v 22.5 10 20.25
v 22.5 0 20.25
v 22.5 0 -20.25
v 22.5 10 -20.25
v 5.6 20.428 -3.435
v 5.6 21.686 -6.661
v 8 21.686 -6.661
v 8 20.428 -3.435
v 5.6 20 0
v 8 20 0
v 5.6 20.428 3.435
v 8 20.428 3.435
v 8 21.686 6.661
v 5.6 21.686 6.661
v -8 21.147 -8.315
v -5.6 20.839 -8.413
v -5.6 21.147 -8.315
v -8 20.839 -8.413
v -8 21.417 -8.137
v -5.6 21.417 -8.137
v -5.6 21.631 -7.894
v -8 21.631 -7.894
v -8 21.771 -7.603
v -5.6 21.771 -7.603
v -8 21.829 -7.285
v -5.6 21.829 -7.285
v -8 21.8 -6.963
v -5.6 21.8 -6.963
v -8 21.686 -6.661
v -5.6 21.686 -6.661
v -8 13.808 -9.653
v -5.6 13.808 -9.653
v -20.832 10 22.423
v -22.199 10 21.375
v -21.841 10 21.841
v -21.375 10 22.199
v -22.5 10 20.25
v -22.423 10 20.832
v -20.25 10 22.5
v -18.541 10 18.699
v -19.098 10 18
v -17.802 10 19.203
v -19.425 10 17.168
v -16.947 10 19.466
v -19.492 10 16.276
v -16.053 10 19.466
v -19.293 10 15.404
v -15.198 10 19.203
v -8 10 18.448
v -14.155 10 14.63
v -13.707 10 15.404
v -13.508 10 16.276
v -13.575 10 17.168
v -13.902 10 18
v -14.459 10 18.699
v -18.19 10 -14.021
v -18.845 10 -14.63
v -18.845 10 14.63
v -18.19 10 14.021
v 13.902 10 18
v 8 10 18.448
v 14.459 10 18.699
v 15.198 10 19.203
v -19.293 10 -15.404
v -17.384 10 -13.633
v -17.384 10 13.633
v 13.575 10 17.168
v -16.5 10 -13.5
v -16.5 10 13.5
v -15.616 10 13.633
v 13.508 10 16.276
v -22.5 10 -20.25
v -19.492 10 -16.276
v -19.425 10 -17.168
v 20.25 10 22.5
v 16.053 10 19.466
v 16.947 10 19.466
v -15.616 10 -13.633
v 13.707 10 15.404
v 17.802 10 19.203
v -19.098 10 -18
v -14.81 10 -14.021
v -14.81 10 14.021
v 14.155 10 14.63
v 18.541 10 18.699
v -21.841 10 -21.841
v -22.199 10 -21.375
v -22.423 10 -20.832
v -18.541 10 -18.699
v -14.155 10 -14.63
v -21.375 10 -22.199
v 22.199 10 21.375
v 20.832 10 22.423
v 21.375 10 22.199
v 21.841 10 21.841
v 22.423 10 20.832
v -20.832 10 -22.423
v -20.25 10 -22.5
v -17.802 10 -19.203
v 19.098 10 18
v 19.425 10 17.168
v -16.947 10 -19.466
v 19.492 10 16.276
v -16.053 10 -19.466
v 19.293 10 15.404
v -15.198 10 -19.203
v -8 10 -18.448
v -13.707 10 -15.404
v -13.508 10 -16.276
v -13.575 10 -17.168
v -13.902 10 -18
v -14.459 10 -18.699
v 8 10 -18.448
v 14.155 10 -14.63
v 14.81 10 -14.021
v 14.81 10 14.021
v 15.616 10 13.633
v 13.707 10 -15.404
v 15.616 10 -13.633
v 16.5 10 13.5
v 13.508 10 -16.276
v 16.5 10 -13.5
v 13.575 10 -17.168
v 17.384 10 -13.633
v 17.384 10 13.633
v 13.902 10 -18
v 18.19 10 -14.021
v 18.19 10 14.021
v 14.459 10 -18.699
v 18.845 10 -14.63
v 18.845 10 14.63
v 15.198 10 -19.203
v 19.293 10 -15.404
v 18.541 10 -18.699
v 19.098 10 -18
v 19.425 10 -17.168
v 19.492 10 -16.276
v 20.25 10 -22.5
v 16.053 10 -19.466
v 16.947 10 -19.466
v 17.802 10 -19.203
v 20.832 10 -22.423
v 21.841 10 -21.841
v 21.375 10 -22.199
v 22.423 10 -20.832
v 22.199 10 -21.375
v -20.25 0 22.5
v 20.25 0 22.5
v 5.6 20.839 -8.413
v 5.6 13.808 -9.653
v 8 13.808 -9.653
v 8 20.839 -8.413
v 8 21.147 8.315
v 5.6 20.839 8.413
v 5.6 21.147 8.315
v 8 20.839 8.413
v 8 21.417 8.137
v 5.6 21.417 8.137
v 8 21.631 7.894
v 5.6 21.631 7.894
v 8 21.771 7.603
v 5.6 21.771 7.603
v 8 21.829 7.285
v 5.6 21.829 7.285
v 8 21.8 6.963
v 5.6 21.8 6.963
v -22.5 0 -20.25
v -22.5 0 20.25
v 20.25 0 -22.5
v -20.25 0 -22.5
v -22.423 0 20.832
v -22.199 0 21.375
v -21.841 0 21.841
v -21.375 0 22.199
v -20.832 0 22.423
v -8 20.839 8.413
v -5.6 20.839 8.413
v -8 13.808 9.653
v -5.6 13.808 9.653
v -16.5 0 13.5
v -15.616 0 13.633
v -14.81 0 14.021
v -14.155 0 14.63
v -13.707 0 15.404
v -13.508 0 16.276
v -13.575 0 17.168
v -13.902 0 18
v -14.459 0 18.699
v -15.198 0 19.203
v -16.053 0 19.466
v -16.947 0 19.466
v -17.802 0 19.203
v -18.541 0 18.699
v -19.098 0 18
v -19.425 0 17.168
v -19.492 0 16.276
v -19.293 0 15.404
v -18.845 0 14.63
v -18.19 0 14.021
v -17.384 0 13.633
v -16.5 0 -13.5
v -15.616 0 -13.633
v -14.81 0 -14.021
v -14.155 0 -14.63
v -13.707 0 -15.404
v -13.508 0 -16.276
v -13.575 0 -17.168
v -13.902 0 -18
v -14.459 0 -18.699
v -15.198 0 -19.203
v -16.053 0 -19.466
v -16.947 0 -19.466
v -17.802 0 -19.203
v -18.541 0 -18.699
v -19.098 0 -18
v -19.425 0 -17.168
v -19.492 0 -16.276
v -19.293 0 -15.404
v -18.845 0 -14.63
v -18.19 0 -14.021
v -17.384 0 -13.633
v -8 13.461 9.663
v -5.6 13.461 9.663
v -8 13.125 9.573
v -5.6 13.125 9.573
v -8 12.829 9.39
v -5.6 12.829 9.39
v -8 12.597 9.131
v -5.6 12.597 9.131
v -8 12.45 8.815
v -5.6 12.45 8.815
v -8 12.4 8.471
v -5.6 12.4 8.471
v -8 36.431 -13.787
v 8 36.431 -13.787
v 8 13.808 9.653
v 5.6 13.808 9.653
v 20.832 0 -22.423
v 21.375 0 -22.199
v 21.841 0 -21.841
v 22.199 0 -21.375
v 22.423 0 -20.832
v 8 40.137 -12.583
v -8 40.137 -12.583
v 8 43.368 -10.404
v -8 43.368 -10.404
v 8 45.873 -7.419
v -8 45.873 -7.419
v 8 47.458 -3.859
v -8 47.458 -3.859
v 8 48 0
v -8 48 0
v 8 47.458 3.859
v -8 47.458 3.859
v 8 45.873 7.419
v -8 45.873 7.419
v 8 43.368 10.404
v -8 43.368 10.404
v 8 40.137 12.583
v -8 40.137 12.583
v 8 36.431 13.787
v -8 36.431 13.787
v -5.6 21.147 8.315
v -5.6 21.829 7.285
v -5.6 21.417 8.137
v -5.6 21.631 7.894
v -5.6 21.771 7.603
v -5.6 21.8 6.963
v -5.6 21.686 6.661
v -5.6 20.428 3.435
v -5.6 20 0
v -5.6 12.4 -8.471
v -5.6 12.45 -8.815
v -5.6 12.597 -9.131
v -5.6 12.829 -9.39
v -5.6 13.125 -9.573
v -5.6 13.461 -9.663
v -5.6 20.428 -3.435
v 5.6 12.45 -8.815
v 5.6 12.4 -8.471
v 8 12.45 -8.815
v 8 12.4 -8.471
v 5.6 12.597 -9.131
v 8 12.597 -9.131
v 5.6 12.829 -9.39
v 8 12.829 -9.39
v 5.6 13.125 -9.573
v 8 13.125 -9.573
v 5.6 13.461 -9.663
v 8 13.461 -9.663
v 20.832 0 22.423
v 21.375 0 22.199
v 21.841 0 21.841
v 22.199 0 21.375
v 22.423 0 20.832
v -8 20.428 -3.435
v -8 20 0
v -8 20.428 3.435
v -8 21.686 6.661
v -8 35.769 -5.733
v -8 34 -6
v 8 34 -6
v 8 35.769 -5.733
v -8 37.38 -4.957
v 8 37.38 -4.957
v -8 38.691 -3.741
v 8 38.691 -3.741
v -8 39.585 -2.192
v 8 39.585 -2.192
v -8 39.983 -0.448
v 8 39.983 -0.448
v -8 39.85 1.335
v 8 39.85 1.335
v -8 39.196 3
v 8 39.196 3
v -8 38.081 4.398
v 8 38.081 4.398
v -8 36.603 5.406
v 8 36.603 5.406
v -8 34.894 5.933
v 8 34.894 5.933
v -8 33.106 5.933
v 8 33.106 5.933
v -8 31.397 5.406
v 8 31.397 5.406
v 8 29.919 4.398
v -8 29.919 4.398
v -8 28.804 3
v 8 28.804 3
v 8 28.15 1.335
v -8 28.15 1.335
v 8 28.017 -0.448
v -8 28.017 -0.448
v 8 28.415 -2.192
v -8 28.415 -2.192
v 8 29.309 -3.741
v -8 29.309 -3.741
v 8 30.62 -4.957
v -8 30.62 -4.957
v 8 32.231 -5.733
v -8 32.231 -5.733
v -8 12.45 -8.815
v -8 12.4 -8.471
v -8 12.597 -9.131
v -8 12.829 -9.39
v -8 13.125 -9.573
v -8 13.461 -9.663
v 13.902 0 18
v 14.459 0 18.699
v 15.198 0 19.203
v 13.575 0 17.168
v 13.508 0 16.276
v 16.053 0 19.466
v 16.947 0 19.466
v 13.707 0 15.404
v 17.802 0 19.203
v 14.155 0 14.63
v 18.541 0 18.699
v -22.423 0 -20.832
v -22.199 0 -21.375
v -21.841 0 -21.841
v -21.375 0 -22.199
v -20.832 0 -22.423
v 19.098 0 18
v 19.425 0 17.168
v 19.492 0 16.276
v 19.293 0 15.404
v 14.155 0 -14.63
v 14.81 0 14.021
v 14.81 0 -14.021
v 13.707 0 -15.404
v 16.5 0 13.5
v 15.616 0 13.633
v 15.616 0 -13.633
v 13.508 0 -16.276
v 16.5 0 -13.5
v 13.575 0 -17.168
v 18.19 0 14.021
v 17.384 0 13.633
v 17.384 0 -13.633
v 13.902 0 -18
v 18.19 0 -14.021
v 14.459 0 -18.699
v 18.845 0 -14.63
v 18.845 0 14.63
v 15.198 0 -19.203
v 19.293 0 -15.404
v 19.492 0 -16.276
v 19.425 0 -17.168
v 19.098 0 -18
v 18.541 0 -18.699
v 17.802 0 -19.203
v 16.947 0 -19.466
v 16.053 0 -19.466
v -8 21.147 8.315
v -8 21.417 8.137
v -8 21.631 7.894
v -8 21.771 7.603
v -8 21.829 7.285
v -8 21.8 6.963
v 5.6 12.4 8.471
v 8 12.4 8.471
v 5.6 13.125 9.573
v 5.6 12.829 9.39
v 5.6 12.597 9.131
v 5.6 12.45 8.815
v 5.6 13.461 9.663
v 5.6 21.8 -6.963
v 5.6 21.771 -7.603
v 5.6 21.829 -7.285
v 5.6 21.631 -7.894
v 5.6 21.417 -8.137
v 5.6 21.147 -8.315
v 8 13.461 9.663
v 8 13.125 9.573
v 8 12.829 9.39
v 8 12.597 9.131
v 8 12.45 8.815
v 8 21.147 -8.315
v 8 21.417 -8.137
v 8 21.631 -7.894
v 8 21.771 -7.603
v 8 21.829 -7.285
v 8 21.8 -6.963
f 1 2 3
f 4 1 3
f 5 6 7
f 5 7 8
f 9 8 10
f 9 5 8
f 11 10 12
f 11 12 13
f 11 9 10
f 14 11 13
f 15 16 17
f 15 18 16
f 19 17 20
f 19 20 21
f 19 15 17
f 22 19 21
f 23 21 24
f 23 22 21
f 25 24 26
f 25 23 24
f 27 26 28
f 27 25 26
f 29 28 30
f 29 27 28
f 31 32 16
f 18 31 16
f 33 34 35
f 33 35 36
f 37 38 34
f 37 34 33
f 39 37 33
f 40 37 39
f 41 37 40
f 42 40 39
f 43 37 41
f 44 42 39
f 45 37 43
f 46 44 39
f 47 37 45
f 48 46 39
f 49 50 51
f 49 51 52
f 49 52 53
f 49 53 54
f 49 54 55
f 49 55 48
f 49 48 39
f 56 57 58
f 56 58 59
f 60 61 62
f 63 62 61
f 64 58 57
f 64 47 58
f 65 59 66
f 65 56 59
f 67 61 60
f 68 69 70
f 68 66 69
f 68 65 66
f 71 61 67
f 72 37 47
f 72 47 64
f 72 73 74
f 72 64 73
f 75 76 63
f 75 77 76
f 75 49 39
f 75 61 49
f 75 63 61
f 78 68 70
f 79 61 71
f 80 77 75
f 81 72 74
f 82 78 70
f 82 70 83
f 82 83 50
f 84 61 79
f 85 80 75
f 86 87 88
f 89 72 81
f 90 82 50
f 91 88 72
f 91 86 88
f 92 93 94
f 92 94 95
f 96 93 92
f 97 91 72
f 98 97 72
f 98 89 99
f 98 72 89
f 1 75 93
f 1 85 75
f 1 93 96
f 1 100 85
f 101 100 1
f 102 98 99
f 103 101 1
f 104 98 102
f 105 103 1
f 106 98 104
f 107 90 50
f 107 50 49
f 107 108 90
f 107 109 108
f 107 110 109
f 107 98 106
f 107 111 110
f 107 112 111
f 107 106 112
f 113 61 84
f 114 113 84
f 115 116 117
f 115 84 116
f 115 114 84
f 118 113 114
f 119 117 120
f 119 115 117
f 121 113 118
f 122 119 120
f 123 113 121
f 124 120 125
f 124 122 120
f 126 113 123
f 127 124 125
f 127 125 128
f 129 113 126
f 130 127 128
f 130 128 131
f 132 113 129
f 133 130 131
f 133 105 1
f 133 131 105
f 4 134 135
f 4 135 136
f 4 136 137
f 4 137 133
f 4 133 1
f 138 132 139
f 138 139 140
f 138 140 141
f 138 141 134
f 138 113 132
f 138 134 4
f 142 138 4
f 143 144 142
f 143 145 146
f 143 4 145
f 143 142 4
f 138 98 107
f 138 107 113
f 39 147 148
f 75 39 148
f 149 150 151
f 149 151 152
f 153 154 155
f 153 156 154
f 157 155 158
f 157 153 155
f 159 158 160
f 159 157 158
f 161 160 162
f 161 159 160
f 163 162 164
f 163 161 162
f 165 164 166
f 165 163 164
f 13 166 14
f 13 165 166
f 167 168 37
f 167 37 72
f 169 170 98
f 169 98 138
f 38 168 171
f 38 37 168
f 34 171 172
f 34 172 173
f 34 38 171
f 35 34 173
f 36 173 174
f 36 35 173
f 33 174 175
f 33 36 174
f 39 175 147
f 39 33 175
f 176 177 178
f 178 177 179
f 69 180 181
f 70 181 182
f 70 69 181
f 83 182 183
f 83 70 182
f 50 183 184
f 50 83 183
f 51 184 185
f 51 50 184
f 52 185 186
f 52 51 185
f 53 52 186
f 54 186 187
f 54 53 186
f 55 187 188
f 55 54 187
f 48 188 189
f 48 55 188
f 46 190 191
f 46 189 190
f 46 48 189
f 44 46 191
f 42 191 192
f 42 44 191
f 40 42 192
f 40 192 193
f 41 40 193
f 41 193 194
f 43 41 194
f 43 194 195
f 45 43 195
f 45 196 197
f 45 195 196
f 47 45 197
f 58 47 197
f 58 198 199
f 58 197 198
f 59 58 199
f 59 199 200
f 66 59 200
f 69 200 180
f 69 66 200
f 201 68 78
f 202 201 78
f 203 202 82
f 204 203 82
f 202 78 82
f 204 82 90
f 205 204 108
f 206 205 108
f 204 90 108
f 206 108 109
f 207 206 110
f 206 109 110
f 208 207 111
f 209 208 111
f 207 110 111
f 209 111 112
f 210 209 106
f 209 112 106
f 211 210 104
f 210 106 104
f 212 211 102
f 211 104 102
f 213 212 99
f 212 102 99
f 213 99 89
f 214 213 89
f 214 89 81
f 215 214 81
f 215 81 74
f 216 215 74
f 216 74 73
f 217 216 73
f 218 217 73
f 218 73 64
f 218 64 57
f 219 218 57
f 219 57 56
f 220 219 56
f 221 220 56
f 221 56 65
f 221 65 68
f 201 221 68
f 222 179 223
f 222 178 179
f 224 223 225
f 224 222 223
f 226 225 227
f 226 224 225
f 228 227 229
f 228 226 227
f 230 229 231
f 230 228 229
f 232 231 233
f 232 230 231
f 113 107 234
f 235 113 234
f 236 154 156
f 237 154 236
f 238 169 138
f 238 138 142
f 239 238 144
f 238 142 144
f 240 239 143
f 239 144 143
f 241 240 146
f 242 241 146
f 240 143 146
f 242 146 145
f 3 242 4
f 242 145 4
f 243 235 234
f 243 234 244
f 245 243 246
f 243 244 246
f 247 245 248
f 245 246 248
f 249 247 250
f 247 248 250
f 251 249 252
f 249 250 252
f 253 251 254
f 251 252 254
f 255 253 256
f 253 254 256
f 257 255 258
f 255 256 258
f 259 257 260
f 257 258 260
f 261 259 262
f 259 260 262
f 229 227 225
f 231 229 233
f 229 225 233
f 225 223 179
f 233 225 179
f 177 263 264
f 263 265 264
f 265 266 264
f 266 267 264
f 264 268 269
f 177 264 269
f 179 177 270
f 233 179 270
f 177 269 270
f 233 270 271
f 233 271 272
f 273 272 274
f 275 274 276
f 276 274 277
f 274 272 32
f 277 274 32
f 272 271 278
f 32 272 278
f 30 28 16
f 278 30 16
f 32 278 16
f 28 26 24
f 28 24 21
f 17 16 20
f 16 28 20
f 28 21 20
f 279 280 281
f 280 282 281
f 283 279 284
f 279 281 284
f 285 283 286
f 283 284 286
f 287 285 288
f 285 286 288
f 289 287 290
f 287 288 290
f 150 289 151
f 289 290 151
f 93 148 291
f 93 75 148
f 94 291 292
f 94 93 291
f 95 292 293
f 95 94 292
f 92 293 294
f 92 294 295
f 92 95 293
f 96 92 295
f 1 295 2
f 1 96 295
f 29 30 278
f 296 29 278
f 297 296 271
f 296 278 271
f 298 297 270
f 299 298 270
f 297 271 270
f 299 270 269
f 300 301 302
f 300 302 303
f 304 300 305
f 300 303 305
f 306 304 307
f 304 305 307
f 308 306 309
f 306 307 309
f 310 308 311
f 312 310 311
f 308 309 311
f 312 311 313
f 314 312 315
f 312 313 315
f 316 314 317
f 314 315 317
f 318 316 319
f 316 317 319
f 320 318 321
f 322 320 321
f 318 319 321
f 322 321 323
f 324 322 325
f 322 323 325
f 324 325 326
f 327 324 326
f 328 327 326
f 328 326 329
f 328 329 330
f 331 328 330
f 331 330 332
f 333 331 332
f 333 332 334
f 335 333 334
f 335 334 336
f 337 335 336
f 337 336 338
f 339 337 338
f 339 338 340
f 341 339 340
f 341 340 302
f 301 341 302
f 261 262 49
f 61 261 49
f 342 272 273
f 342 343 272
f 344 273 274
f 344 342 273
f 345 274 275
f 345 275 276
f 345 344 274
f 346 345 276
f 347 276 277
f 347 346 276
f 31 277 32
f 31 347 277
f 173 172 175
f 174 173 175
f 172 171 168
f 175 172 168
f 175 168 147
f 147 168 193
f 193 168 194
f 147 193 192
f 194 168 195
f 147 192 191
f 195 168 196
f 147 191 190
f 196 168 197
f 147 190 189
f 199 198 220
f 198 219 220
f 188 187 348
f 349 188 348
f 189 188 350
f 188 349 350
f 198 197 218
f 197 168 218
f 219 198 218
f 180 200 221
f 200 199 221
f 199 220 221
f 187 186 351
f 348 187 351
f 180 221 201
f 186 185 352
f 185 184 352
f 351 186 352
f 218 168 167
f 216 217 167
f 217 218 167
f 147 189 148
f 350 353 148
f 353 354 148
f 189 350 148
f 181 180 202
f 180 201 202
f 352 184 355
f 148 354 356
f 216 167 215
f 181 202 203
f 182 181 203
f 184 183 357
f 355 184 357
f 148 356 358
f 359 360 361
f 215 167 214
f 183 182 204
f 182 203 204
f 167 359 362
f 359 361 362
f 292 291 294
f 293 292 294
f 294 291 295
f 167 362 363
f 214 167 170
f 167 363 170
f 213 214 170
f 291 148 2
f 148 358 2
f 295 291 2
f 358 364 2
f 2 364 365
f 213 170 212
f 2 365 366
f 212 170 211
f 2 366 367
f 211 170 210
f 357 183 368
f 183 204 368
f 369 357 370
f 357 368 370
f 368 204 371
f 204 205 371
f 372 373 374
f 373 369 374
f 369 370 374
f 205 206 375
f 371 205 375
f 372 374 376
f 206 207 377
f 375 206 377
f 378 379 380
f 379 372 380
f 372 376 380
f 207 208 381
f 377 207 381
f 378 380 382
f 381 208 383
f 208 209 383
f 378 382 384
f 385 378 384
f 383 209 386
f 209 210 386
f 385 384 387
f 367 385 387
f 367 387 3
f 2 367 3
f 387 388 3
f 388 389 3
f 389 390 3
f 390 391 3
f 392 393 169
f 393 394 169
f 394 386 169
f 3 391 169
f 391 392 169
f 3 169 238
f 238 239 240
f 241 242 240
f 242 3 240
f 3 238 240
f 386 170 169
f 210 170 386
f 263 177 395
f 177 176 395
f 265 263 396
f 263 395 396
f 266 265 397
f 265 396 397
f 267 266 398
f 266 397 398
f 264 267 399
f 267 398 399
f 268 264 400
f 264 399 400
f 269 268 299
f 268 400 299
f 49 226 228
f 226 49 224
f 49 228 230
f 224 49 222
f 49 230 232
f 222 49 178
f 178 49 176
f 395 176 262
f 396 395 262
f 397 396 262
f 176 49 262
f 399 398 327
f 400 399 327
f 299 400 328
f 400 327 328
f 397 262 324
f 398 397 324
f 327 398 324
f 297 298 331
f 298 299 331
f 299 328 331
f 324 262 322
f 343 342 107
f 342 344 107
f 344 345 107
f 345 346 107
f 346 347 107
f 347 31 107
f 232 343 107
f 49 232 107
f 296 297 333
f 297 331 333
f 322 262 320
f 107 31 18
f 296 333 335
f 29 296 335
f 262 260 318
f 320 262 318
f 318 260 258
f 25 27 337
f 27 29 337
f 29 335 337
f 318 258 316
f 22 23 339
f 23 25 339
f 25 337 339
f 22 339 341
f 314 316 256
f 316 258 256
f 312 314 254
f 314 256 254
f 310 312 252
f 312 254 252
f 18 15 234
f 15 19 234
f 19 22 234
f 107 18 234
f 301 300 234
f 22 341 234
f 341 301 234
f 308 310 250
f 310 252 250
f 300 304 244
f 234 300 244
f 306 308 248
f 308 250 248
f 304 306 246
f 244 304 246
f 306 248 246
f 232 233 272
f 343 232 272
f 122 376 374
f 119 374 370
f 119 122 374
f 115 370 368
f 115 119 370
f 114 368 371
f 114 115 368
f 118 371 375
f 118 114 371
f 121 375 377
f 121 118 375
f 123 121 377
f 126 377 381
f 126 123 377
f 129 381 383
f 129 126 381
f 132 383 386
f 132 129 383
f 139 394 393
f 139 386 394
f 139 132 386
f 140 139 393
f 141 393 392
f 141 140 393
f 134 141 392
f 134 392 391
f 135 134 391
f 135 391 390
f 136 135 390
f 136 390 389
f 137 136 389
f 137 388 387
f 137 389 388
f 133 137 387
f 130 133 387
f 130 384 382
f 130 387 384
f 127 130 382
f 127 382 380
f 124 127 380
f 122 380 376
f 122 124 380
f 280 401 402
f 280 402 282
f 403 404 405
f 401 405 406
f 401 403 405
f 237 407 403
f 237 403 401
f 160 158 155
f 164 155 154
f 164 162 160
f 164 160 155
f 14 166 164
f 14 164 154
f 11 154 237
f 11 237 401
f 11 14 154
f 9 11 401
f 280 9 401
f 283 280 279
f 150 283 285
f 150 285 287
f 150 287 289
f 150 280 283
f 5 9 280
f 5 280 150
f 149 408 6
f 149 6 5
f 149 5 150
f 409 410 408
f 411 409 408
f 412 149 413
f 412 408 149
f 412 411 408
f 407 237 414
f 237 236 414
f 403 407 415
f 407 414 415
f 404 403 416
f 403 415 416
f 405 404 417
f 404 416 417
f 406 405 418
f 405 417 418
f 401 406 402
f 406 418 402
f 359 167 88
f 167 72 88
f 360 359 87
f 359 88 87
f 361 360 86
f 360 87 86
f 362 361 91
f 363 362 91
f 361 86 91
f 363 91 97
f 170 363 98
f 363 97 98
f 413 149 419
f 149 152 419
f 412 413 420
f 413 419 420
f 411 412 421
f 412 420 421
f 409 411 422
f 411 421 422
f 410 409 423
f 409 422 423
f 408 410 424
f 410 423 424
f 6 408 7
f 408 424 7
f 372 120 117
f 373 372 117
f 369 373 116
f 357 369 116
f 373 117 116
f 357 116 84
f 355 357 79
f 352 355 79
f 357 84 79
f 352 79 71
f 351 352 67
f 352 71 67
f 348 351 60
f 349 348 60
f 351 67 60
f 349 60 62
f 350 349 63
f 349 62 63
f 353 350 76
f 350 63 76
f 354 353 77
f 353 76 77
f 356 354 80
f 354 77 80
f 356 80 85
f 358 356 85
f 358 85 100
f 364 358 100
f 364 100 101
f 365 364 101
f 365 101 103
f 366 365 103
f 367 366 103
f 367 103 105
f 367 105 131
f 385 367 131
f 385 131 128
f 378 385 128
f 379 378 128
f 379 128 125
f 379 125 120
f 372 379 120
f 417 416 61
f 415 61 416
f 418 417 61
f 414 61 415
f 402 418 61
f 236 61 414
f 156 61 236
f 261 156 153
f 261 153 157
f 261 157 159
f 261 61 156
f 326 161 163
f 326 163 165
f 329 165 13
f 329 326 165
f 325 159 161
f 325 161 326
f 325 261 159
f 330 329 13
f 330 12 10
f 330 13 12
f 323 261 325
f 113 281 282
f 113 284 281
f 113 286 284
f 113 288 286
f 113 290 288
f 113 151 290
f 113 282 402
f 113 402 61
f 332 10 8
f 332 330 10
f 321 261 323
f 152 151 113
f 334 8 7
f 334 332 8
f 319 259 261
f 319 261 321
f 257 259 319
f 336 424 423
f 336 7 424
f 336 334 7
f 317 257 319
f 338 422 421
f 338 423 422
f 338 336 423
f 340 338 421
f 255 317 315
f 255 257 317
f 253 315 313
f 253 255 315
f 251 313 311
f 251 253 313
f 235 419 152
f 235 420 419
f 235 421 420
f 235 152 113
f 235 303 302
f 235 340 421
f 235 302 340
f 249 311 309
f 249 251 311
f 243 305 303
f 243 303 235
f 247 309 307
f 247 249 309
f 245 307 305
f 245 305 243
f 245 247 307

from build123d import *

# Parameters (mm, degrees)
SKETCH_3_W               = 45
SKETCH_3_H               = 45
EXTRUDE_1_DEPTH          = 10
EXTRUDE_START            = -8
EXTRUDE_2_DEPTH          = 16
SKETCH_5_R               = 6
CUT_EXTRUDE_1_DEPTH      = 62.159627206
CUT_EXTRUDE_START        = -2.4
CUT_EXTRUDE_3_DEPTH      = 2.4
SKETCH_7_R               = 3
CUT_EXTRUDE_2_DEPTH      = 50.563091106
MIRROR_2_COPY_1_SKETCH_R = 3
MIRROR_2_COPY_1_DEPTH    = 50.563091106
FILLET_1_R               = 2.25
FILLET_2_R               = 1.2


with BuildPart() as part:
    # 草图3 → 凸台-拉伸1 (new body)
    with BuildSketch(Plane(origin=(0, 0, 0), x_dir=(1, 0, 0), z_dir=(0, 1, 0))):
        Rectangle(SKETCH_3_W, SKETCH_3_H)
    extrude(amount=EXTRUDE_1_DEPTH)

    # 草图4 → 凸台-拉伸2 (add)
    with BuildSketch(Plane(origin=(0, 0, 0), x_dir=(0, 0, -1), z_dir=(1, 0, 0)).offset(EXTRUDE_START)):
        with BuildLine():
            Line((-13.787308542, 36.431074487), (-18.447820103, 10))
            Line((-18.447820103, 10), (18.447820103, 10))
            Line((18.447820103, 10), (13.787308542, 36.431074487))
            ThreePointArc((13.787308542, 36.431074487), (0, 48), (-13.787308542, 36.431074487))
        make_face()
    extrude(amount=EXTRUDE_2_DEPTH)

    # 草图5 → 切除-拉伸1 (cut, through all)
    with BuildSketch(Plane(origin=(8, 0, 0), x_dir=(0, 0, -1), z_dir=(1, 0, 0))):
        with Locations((0, 34)):
            Circle(SKETCH_5_R)
    extrude(amount=-CUT_EXTRUDE_1_DEPTH, mode=Mode.SUBTRACT)

    # 草图8 → 切除-拉伸3 (cut)
    with BuildSketch(Plane(origin=(8, 0, 0), x_dir=(0, 0, -1), z_dir=(1, 0, 0)).offset(CUT_EXTRUDE_START)):
        with BuildLine():
            Line((-8.10534153, 22.584946838), (-9.901222455, 12.4))
            Line((-9.901222455, 12.4), (9.901222455, 12.4))
            Line((9.901222455, 12.4), (8.10534153, 22.584946838))
            ThreePointArc((8.10534153, 22.584946838), (0, 20), (-8.10534153, 22.584946838))
        make_face()
    cut_extrude_3 = extrude(amount=CUT_EXTRUDE_3_DEPTH, mode=Mode.SUBTRACT)

    # 镜向3: 切除-拉伸3 across plane
    add(cut_extrude_3.mirror(Plane(origin=(0, 0, 0), x_dir=(0, 0, 1), z_dir=(1, 0, 0))), mode=Mode.SUBTRACT)

    # 草图7 → 切除-拉伸2 (cut, through all)
    with BuildSketch(Plane(origin=(0, 10, 0), x_dir=(1, 0, 0), z_dir=(0, 1, 0))):
        with Locations(Location((-16.5, 16.5, 0), (0, 0, 270))):
            Circle(SKETCH_7_R)
    cut_extrude_2 = extrude(amount=-CUT_EXTRUDE_2_DEPTH, mode=Mode.SUBTRACT)

    # 镜向1: 切除-拉伸2 across plane
    add(cut_extrude_2.mirror(Plane(origin=(0, 0, 0), x_dir=(0, 0, 1), z_dir=(1, 0, 0))), mode=Mode.SUBTRACT)

    # 镜向2: 切除-拉伸2 across plane
    add(cut_extrude_2.mirror(Plane.XY), mode=Mode.SUBTRACT)

    # 镜向2 copy 1 sketch → 镜向2 copy 1 (cut, through all)
    with BuildSketch(Plane(origin=(0, 10, 0), x_dir=(-1, 0, 0), z_dir=(0, 1, 0))):
        with Locations(Location((-16.5, 16.5, 0), (0, 0, 270))):
            Circle(MIRROR_2_COPY_1_SKETCH_R)
    extrude(amount=-MIRROR_2_COPY_1_DEPTH, mode=Mode.SUBTRACT)

    # 圆角1
    fillet_1_edges = [part.edges().sort_by_distance(p)[0] for p in [
        (-22.5, 5, 22.5),
        (-22.5, 5, -22.5),
        (22.5, 5, -22.5),
        (22.5, 5, 22.5),
    ]]
    fillet(fillet_1_edges, radius=FILLET_1_R)

    # 圆角2
    fillet_2_edges = [part.edges().sort_by_distance(p)[0] for p in [
        (6.8, 22.584946838, 8.10534153),
        (6.8, 22.584946838, -8.10534153),
        (6.8, 12.4, -9.901222455),
        (6.8, 12.4, 9.901222455),
        (-6.8, 22.584946838, -8.10534153),
        (-6.8, 22.584946838, 8.10534153),
        (-6.8, 12.4, 9.901222455),
        (-6.8, 12.4, -9.901222455),
    ]]
    fillet(fillet_2_edges, radius=FILLET_2_R)


solid = part.part
